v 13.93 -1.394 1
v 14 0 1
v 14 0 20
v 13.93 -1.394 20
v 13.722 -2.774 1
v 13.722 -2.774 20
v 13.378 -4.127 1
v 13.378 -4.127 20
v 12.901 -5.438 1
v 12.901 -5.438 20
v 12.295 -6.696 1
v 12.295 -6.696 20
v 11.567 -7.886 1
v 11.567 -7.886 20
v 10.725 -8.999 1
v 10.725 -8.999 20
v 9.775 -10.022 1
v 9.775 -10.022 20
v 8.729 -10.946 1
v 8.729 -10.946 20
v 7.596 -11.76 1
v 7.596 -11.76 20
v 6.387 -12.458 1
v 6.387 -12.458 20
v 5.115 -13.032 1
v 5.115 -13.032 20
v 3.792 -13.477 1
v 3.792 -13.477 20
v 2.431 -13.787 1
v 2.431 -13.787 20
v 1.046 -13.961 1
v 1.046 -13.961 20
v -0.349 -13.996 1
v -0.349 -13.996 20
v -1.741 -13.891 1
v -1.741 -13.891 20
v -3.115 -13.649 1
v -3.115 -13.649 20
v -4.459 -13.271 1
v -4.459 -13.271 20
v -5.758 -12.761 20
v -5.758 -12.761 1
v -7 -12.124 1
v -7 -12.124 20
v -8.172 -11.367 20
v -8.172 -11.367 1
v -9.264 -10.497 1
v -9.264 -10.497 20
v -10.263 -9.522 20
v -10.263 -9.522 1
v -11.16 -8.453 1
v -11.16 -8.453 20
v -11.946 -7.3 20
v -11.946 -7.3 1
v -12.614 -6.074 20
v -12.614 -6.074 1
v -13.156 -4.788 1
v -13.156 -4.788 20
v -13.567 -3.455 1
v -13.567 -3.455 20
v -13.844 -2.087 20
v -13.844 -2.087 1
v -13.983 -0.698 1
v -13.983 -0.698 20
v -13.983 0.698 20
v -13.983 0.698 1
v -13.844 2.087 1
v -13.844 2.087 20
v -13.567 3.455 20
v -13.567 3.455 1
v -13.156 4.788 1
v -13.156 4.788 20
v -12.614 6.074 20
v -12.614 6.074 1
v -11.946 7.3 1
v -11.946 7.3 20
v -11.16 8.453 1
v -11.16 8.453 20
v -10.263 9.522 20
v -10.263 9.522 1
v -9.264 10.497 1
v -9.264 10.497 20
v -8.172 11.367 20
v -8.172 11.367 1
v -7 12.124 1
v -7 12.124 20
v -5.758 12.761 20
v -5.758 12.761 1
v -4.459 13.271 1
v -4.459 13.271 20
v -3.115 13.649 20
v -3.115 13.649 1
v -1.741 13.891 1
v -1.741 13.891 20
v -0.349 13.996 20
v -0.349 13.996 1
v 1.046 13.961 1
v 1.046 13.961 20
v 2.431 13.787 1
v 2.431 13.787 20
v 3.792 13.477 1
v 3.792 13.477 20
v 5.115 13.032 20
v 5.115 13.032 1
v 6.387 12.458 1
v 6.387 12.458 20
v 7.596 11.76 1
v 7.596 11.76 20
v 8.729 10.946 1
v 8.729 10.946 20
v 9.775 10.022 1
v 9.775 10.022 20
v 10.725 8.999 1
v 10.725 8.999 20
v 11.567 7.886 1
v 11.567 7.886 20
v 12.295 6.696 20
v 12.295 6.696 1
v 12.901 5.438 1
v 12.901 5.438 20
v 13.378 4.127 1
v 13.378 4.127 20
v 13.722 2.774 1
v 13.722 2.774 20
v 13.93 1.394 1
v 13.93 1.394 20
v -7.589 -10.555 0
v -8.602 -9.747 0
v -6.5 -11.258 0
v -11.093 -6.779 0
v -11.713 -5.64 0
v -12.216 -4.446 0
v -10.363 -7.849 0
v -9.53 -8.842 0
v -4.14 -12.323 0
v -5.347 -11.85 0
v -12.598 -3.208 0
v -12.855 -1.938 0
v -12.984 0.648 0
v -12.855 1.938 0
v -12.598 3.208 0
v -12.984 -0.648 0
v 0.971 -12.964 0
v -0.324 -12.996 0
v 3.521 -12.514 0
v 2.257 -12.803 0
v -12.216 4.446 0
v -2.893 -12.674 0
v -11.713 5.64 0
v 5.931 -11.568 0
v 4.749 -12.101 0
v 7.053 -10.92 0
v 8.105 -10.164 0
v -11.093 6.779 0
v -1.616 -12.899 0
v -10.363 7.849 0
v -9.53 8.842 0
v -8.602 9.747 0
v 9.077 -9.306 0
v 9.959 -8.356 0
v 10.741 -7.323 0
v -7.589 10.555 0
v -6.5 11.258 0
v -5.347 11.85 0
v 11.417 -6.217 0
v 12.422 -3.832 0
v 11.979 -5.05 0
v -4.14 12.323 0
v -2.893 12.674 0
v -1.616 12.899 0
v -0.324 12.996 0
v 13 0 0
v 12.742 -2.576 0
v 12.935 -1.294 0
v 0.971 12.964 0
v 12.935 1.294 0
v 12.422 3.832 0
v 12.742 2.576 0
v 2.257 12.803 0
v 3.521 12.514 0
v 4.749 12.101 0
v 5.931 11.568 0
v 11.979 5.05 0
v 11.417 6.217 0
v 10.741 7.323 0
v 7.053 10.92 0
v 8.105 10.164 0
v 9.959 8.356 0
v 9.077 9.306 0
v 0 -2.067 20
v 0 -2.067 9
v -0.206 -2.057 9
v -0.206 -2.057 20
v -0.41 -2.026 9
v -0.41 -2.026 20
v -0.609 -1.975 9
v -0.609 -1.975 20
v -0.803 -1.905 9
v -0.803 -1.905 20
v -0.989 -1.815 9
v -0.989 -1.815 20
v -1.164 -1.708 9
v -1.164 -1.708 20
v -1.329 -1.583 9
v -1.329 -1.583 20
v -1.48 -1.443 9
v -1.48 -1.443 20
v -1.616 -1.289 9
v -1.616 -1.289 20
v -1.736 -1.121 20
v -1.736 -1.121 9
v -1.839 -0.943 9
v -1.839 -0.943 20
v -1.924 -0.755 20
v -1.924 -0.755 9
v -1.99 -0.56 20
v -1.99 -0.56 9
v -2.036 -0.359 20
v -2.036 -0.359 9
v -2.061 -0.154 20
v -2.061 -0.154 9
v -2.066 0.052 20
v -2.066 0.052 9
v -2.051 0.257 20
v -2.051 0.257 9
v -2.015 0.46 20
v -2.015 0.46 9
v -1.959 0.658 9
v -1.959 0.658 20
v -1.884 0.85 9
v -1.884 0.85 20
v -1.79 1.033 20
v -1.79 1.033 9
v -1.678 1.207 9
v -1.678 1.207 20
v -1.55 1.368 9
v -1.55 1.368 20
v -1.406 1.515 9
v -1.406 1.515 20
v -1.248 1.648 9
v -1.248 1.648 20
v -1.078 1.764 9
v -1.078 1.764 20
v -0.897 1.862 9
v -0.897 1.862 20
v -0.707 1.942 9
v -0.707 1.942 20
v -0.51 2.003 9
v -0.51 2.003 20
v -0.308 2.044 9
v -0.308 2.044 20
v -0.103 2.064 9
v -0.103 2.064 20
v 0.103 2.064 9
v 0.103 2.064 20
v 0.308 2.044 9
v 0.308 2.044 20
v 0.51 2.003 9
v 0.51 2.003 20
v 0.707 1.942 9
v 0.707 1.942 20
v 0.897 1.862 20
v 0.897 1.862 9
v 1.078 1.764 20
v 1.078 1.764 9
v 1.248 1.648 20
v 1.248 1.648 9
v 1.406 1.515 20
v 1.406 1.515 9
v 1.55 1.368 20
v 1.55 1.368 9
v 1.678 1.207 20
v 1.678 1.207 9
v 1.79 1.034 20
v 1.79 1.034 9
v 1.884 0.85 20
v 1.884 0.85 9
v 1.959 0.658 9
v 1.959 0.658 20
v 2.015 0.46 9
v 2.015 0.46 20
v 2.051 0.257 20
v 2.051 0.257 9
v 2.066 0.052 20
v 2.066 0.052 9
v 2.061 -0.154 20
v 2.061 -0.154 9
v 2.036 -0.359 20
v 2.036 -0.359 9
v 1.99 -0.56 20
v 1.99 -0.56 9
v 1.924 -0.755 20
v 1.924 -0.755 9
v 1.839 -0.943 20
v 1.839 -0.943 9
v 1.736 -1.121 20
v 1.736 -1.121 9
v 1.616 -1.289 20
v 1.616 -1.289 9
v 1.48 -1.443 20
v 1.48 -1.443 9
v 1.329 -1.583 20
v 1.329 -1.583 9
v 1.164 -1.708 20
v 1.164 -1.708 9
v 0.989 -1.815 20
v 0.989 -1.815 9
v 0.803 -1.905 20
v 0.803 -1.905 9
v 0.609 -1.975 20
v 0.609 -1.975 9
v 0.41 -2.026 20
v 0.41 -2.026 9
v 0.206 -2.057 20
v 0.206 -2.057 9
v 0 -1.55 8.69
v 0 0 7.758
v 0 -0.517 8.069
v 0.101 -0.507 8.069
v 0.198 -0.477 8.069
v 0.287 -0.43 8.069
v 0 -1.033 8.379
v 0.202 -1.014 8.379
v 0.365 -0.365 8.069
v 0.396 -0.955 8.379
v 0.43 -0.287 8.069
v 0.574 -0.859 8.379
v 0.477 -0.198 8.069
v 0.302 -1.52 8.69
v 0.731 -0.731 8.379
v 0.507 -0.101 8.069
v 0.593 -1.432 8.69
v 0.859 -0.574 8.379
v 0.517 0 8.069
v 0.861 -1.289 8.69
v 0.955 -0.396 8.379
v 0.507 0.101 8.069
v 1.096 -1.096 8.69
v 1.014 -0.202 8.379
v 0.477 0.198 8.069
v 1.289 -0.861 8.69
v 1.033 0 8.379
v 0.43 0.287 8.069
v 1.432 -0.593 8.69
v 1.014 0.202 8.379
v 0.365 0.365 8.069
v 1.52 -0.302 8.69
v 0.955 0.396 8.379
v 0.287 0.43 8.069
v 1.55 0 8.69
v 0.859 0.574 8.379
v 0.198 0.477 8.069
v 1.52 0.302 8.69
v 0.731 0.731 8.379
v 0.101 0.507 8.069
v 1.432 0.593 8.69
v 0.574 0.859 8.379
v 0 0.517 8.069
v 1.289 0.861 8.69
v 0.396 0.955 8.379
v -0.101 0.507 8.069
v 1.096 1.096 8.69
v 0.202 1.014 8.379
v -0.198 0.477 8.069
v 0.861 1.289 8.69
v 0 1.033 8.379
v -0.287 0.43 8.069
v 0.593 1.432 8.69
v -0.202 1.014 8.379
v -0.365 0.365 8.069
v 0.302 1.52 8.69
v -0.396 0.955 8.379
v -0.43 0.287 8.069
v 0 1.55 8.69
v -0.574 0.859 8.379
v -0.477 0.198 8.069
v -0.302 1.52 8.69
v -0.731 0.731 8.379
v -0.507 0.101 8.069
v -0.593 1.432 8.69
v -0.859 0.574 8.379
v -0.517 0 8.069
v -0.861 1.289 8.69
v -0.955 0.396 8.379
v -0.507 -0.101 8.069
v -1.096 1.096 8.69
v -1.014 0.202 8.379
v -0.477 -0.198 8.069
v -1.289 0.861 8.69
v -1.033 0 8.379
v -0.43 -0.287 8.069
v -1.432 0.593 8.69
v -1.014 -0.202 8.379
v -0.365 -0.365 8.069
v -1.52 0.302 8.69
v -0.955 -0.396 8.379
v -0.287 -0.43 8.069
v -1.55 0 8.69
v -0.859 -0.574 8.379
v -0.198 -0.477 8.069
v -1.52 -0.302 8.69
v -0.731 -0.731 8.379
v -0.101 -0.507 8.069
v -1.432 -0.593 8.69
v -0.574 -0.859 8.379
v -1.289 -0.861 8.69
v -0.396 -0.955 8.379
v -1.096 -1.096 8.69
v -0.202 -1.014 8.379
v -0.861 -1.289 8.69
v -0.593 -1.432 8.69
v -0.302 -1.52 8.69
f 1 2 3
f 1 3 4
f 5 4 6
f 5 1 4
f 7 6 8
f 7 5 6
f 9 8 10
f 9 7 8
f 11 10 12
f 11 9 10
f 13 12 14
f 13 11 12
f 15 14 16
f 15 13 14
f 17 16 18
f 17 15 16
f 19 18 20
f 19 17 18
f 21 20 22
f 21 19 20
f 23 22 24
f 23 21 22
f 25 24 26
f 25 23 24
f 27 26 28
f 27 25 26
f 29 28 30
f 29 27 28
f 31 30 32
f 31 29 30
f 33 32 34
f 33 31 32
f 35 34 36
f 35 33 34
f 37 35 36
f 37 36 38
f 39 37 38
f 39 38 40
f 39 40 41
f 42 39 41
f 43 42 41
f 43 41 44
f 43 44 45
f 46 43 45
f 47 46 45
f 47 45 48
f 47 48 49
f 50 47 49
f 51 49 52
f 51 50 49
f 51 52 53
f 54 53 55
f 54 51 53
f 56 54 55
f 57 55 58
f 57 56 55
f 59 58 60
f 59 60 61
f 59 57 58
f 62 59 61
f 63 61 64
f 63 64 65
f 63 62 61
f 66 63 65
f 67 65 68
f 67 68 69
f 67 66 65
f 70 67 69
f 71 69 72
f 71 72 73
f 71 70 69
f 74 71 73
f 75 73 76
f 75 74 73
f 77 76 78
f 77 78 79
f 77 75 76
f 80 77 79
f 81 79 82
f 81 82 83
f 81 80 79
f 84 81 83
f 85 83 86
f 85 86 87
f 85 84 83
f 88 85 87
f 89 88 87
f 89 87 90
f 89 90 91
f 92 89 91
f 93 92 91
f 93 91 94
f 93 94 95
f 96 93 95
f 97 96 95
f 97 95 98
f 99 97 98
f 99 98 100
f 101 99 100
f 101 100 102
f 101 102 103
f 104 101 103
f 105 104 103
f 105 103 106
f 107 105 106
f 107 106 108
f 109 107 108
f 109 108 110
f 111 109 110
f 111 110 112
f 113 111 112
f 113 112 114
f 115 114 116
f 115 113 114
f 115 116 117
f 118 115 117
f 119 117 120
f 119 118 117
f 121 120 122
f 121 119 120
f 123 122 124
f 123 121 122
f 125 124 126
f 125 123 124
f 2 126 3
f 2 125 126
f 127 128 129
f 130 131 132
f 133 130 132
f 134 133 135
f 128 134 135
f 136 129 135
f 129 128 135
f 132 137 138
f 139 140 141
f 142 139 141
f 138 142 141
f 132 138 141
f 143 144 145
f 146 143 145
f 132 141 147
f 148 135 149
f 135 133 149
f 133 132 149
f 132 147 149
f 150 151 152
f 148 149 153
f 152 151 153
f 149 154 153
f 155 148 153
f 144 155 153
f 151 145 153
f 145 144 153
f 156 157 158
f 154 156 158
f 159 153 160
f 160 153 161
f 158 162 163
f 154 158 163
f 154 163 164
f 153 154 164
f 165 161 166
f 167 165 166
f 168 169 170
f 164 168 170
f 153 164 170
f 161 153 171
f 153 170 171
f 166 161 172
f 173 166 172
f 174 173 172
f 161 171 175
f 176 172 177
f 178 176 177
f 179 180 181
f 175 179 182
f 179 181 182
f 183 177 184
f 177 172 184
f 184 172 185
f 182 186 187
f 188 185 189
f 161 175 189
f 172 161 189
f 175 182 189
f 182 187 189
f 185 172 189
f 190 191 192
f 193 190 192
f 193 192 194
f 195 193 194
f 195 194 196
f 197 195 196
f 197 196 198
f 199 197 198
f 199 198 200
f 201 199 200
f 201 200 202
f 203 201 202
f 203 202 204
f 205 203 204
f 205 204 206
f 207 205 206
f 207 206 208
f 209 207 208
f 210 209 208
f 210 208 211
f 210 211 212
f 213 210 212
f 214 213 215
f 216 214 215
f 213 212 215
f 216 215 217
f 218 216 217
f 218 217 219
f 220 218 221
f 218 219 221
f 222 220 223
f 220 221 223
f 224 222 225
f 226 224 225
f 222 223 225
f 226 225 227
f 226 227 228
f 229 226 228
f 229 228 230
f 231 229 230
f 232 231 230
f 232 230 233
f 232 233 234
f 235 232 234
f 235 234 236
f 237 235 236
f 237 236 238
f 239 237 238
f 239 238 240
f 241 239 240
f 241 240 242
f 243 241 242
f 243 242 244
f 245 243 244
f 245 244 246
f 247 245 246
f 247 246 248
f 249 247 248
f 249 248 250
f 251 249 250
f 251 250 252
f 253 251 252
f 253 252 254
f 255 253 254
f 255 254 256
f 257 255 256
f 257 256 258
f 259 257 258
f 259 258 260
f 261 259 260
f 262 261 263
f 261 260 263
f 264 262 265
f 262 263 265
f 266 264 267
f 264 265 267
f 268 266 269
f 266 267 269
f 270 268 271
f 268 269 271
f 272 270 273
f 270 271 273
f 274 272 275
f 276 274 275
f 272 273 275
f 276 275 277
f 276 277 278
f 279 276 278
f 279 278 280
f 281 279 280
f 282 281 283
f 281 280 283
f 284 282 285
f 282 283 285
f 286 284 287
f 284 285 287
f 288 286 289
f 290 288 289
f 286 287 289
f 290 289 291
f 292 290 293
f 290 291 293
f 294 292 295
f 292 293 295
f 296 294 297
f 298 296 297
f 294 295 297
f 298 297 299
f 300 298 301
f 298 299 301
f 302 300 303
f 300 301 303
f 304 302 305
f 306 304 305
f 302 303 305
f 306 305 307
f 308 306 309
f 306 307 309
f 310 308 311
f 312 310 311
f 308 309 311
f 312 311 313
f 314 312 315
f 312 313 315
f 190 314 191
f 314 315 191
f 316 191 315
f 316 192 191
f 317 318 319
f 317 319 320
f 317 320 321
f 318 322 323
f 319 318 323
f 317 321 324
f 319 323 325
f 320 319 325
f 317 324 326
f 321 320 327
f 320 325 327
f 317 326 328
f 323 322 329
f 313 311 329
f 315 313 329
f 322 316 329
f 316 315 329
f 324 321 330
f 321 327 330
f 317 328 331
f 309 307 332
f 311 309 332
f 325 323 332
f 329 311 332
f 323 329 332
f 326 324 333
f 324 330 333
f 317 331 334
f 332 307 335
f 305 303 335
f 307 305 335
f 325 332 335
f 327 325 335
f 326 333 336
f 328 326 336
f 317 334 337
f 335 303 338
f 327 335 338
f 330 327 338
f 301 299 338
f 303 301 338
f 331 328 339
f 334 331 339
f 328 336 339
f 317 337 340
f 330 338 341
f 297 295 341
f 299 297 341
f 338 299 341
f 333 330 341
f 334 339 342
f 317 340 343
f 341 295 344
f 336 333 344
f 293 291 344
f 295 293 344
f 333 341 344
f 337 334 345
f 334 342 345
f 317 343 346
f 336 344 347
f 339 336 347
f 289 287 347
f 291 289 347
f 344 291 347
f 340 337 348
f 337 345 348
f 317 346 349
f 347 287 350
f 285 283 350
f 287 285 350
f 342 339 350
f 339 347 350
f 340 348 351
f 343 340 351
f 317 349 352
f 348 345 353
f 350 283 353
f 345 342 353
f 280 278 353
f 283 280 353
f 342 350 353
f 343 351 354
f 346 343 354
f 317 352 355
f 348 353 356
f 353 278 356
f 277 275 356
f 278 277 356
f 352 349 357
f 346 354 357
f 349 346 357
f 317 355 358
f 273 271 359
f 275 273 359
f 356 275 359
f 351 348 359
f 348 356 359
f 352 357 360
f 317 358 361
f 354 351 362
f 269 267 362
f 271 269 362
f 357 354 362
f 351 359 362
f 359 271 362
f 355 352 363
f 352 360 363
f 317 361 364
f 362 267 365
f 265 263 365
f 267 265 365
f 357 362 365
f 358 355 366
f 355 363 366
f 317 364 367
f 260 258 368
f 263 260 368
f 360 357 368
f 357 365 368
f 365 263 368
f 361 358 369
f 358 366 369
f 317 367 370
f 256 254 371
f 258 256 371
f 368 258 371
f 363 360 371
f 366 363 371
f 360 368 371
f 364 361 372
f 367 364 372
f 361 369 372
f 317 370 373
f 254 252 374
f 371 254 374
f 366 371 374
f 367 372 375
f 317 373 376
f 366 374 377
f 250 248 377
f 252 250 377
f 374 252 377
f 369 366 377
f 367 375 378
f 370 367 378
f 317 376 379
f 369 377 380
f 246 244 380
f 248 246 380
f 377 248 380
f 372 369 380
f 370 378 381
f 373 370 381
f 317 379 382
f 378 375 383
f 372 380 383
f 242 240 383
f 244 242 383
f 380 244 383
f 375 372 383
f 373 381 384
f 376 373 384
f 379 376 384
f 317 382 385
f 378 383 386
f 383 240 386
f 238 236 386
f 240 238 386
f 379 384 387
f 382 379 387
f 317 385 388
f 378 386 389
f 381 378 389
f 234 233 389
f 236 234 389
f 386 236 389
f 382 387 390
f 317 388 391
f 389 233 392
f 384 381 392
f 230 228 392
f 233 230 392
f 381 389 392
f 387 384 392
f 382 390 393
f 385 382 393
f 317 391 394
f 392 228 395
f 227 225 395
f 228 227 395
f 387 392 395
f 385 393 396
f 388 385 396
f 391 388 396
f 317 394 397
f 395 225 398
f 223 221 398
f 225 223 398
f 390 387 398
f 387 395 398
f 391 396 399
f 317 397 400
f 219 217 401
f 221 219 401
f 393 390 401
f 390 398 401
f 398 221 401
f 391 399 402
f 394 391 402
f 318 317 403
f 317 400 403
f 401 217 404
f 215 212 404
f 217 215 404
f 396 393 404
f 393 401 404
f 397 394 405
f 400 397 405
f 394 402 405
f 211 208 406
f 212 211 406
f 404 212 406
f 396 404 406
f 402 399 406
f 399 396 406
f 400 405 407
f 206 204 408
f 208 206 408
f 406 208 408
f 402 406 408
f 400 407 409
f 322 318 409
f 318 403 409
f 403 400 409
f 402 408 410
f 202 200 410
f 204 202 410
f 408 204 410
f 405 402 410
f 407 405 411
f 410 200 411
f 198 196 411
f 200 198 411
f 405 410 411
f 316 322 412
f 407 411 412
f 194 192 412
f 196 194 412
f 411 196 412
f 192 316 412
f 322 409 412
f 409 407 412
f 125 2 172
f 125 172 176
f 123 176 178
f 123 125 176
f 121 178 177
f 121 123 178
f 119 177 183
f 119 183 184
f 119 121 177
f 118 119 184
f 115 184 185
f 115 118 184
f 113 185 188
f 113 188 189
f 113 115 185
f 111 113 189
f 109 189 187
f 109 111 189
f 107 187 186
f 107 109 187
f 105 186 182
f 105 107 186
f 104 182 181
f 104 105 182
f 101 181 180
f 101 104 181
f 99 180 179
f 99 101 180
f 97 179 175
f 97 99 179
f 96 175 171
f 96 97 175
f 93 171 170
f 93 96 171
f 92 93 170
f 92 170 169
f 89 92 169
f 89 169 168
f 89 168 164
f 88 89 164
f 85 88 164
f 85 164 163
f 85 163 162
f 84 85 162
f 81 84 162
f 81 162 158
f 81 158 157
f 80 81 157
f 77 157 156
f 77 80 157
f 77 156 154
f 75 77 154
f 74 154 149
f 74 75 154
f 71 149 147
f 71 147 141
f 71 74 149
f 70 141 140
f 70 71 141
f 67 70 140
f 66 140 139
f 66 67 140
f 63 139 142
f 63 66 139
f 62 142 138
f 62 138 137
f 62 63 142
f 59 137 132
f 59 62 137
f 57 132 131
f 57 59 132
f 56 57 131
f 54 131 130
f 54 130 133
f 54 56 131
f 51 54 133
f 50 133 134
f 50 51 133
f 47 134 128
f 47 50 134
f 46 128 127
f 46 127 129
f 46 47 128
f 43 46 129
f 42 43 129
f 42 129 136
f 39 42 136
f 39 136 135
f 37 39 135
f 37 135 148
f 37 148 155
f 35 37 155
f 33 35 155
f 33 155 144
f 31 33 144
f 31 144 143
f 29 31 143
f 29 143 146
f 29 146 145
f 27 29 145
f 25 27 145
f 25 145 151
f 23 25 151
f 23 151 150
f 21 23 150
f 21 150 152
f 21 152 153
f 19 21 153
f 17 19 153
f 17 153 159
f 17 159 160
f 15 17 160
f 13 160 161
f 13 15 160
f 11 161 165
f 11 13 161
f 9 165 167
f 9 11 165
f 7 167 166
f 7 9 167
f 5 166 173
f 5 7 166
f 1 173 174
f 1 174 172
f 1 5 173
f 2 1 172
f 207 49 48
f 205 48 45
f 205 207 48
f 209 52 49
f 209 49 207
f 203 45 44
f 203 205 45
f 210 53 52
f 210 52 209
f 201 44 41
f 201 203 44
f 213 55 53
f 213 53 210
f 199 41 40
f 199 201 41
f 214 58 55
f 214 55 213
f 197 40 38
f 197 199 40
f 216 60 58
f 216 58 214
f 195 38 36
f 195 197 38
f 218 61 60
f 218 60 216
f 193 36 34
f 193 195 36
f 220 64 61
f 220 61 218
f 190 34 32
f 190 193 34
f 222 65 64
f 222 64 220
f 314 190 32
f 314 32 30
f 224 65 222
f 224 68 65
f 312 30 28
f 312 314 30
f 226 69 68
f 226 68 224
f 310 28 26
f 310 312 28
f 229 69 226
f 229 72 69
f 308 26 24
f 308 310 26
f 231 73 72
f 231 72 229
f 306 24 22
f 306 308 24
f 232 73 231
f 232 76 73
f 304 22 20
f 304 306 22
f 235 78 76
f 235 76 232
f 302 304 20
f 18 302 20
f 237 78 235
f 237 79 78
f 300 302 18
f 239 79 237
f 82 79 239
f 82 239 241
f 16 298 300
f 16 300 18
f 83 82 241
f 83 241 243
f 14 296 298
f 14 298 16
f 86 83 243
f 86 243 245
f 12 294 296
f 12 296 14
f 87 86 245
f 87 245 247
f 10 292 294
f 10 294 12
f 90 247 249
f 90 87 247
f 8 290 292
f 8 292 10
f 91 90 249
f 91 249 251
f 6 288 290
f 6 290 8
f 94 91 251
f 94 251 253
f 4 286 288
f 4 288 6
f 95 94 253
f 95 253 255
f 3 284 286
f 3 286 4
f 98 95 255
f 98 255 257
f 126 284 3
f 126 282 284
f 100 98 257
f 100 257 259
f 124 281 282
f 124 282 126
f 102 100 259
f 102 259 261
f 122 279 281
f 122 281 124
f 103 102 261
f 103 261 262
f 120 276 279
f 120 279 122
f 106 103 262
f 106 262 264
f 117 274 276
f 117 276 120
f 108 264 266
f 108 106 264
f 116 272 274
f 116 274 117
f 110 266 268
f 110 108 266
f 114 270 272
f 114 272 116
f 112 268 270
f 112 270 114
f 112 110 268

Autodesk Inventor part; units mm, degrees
ref_plane "YZ Plane" through (0, 0, 0) normal (1, 0, 0) x (0, 1, 0)
ref_plane "XZ Plane" through (0, 0, 0) normal (0, 1, 0) x (-1, 0, 0)
ref_plane "XY Plane" through (0, 0, 0) normal (0, 0, 1) x (1, 0, 0)
sketch "Skizze1" plane through (0, 0, 0) normal (0, 0, 1) x (1, 0, 0)
  line L0 (-19.6, 0) -> (19.6, 0) projected
  line L1 (0, -19.6) -> (0, 19.6) projected
  circle A0 centre (0, 0) radius 14
  dimension "d0" = 28
extrude "Extrusion1" add sketch "Skizze1" along normal blind 20
chamfer "Fase1" distance 1 angle 45 1 edges at (-14, 0, 0)
sketch "Skizze2" plane through (0, 0, 20) normal (0, 0, 1) x (1, 0, 0)
  point P0 (0, 0)
  point P1 (0, 0)
hole "Bohrung1" at (0, 0, 20) direction (0, 0, -1) diameter 4.134 depth 11 tip angle 118 thread size "M5x0.8" class "6H" standard "ISO Metric profile"
properties part number "Gummistopl groß" material "Stahl"
